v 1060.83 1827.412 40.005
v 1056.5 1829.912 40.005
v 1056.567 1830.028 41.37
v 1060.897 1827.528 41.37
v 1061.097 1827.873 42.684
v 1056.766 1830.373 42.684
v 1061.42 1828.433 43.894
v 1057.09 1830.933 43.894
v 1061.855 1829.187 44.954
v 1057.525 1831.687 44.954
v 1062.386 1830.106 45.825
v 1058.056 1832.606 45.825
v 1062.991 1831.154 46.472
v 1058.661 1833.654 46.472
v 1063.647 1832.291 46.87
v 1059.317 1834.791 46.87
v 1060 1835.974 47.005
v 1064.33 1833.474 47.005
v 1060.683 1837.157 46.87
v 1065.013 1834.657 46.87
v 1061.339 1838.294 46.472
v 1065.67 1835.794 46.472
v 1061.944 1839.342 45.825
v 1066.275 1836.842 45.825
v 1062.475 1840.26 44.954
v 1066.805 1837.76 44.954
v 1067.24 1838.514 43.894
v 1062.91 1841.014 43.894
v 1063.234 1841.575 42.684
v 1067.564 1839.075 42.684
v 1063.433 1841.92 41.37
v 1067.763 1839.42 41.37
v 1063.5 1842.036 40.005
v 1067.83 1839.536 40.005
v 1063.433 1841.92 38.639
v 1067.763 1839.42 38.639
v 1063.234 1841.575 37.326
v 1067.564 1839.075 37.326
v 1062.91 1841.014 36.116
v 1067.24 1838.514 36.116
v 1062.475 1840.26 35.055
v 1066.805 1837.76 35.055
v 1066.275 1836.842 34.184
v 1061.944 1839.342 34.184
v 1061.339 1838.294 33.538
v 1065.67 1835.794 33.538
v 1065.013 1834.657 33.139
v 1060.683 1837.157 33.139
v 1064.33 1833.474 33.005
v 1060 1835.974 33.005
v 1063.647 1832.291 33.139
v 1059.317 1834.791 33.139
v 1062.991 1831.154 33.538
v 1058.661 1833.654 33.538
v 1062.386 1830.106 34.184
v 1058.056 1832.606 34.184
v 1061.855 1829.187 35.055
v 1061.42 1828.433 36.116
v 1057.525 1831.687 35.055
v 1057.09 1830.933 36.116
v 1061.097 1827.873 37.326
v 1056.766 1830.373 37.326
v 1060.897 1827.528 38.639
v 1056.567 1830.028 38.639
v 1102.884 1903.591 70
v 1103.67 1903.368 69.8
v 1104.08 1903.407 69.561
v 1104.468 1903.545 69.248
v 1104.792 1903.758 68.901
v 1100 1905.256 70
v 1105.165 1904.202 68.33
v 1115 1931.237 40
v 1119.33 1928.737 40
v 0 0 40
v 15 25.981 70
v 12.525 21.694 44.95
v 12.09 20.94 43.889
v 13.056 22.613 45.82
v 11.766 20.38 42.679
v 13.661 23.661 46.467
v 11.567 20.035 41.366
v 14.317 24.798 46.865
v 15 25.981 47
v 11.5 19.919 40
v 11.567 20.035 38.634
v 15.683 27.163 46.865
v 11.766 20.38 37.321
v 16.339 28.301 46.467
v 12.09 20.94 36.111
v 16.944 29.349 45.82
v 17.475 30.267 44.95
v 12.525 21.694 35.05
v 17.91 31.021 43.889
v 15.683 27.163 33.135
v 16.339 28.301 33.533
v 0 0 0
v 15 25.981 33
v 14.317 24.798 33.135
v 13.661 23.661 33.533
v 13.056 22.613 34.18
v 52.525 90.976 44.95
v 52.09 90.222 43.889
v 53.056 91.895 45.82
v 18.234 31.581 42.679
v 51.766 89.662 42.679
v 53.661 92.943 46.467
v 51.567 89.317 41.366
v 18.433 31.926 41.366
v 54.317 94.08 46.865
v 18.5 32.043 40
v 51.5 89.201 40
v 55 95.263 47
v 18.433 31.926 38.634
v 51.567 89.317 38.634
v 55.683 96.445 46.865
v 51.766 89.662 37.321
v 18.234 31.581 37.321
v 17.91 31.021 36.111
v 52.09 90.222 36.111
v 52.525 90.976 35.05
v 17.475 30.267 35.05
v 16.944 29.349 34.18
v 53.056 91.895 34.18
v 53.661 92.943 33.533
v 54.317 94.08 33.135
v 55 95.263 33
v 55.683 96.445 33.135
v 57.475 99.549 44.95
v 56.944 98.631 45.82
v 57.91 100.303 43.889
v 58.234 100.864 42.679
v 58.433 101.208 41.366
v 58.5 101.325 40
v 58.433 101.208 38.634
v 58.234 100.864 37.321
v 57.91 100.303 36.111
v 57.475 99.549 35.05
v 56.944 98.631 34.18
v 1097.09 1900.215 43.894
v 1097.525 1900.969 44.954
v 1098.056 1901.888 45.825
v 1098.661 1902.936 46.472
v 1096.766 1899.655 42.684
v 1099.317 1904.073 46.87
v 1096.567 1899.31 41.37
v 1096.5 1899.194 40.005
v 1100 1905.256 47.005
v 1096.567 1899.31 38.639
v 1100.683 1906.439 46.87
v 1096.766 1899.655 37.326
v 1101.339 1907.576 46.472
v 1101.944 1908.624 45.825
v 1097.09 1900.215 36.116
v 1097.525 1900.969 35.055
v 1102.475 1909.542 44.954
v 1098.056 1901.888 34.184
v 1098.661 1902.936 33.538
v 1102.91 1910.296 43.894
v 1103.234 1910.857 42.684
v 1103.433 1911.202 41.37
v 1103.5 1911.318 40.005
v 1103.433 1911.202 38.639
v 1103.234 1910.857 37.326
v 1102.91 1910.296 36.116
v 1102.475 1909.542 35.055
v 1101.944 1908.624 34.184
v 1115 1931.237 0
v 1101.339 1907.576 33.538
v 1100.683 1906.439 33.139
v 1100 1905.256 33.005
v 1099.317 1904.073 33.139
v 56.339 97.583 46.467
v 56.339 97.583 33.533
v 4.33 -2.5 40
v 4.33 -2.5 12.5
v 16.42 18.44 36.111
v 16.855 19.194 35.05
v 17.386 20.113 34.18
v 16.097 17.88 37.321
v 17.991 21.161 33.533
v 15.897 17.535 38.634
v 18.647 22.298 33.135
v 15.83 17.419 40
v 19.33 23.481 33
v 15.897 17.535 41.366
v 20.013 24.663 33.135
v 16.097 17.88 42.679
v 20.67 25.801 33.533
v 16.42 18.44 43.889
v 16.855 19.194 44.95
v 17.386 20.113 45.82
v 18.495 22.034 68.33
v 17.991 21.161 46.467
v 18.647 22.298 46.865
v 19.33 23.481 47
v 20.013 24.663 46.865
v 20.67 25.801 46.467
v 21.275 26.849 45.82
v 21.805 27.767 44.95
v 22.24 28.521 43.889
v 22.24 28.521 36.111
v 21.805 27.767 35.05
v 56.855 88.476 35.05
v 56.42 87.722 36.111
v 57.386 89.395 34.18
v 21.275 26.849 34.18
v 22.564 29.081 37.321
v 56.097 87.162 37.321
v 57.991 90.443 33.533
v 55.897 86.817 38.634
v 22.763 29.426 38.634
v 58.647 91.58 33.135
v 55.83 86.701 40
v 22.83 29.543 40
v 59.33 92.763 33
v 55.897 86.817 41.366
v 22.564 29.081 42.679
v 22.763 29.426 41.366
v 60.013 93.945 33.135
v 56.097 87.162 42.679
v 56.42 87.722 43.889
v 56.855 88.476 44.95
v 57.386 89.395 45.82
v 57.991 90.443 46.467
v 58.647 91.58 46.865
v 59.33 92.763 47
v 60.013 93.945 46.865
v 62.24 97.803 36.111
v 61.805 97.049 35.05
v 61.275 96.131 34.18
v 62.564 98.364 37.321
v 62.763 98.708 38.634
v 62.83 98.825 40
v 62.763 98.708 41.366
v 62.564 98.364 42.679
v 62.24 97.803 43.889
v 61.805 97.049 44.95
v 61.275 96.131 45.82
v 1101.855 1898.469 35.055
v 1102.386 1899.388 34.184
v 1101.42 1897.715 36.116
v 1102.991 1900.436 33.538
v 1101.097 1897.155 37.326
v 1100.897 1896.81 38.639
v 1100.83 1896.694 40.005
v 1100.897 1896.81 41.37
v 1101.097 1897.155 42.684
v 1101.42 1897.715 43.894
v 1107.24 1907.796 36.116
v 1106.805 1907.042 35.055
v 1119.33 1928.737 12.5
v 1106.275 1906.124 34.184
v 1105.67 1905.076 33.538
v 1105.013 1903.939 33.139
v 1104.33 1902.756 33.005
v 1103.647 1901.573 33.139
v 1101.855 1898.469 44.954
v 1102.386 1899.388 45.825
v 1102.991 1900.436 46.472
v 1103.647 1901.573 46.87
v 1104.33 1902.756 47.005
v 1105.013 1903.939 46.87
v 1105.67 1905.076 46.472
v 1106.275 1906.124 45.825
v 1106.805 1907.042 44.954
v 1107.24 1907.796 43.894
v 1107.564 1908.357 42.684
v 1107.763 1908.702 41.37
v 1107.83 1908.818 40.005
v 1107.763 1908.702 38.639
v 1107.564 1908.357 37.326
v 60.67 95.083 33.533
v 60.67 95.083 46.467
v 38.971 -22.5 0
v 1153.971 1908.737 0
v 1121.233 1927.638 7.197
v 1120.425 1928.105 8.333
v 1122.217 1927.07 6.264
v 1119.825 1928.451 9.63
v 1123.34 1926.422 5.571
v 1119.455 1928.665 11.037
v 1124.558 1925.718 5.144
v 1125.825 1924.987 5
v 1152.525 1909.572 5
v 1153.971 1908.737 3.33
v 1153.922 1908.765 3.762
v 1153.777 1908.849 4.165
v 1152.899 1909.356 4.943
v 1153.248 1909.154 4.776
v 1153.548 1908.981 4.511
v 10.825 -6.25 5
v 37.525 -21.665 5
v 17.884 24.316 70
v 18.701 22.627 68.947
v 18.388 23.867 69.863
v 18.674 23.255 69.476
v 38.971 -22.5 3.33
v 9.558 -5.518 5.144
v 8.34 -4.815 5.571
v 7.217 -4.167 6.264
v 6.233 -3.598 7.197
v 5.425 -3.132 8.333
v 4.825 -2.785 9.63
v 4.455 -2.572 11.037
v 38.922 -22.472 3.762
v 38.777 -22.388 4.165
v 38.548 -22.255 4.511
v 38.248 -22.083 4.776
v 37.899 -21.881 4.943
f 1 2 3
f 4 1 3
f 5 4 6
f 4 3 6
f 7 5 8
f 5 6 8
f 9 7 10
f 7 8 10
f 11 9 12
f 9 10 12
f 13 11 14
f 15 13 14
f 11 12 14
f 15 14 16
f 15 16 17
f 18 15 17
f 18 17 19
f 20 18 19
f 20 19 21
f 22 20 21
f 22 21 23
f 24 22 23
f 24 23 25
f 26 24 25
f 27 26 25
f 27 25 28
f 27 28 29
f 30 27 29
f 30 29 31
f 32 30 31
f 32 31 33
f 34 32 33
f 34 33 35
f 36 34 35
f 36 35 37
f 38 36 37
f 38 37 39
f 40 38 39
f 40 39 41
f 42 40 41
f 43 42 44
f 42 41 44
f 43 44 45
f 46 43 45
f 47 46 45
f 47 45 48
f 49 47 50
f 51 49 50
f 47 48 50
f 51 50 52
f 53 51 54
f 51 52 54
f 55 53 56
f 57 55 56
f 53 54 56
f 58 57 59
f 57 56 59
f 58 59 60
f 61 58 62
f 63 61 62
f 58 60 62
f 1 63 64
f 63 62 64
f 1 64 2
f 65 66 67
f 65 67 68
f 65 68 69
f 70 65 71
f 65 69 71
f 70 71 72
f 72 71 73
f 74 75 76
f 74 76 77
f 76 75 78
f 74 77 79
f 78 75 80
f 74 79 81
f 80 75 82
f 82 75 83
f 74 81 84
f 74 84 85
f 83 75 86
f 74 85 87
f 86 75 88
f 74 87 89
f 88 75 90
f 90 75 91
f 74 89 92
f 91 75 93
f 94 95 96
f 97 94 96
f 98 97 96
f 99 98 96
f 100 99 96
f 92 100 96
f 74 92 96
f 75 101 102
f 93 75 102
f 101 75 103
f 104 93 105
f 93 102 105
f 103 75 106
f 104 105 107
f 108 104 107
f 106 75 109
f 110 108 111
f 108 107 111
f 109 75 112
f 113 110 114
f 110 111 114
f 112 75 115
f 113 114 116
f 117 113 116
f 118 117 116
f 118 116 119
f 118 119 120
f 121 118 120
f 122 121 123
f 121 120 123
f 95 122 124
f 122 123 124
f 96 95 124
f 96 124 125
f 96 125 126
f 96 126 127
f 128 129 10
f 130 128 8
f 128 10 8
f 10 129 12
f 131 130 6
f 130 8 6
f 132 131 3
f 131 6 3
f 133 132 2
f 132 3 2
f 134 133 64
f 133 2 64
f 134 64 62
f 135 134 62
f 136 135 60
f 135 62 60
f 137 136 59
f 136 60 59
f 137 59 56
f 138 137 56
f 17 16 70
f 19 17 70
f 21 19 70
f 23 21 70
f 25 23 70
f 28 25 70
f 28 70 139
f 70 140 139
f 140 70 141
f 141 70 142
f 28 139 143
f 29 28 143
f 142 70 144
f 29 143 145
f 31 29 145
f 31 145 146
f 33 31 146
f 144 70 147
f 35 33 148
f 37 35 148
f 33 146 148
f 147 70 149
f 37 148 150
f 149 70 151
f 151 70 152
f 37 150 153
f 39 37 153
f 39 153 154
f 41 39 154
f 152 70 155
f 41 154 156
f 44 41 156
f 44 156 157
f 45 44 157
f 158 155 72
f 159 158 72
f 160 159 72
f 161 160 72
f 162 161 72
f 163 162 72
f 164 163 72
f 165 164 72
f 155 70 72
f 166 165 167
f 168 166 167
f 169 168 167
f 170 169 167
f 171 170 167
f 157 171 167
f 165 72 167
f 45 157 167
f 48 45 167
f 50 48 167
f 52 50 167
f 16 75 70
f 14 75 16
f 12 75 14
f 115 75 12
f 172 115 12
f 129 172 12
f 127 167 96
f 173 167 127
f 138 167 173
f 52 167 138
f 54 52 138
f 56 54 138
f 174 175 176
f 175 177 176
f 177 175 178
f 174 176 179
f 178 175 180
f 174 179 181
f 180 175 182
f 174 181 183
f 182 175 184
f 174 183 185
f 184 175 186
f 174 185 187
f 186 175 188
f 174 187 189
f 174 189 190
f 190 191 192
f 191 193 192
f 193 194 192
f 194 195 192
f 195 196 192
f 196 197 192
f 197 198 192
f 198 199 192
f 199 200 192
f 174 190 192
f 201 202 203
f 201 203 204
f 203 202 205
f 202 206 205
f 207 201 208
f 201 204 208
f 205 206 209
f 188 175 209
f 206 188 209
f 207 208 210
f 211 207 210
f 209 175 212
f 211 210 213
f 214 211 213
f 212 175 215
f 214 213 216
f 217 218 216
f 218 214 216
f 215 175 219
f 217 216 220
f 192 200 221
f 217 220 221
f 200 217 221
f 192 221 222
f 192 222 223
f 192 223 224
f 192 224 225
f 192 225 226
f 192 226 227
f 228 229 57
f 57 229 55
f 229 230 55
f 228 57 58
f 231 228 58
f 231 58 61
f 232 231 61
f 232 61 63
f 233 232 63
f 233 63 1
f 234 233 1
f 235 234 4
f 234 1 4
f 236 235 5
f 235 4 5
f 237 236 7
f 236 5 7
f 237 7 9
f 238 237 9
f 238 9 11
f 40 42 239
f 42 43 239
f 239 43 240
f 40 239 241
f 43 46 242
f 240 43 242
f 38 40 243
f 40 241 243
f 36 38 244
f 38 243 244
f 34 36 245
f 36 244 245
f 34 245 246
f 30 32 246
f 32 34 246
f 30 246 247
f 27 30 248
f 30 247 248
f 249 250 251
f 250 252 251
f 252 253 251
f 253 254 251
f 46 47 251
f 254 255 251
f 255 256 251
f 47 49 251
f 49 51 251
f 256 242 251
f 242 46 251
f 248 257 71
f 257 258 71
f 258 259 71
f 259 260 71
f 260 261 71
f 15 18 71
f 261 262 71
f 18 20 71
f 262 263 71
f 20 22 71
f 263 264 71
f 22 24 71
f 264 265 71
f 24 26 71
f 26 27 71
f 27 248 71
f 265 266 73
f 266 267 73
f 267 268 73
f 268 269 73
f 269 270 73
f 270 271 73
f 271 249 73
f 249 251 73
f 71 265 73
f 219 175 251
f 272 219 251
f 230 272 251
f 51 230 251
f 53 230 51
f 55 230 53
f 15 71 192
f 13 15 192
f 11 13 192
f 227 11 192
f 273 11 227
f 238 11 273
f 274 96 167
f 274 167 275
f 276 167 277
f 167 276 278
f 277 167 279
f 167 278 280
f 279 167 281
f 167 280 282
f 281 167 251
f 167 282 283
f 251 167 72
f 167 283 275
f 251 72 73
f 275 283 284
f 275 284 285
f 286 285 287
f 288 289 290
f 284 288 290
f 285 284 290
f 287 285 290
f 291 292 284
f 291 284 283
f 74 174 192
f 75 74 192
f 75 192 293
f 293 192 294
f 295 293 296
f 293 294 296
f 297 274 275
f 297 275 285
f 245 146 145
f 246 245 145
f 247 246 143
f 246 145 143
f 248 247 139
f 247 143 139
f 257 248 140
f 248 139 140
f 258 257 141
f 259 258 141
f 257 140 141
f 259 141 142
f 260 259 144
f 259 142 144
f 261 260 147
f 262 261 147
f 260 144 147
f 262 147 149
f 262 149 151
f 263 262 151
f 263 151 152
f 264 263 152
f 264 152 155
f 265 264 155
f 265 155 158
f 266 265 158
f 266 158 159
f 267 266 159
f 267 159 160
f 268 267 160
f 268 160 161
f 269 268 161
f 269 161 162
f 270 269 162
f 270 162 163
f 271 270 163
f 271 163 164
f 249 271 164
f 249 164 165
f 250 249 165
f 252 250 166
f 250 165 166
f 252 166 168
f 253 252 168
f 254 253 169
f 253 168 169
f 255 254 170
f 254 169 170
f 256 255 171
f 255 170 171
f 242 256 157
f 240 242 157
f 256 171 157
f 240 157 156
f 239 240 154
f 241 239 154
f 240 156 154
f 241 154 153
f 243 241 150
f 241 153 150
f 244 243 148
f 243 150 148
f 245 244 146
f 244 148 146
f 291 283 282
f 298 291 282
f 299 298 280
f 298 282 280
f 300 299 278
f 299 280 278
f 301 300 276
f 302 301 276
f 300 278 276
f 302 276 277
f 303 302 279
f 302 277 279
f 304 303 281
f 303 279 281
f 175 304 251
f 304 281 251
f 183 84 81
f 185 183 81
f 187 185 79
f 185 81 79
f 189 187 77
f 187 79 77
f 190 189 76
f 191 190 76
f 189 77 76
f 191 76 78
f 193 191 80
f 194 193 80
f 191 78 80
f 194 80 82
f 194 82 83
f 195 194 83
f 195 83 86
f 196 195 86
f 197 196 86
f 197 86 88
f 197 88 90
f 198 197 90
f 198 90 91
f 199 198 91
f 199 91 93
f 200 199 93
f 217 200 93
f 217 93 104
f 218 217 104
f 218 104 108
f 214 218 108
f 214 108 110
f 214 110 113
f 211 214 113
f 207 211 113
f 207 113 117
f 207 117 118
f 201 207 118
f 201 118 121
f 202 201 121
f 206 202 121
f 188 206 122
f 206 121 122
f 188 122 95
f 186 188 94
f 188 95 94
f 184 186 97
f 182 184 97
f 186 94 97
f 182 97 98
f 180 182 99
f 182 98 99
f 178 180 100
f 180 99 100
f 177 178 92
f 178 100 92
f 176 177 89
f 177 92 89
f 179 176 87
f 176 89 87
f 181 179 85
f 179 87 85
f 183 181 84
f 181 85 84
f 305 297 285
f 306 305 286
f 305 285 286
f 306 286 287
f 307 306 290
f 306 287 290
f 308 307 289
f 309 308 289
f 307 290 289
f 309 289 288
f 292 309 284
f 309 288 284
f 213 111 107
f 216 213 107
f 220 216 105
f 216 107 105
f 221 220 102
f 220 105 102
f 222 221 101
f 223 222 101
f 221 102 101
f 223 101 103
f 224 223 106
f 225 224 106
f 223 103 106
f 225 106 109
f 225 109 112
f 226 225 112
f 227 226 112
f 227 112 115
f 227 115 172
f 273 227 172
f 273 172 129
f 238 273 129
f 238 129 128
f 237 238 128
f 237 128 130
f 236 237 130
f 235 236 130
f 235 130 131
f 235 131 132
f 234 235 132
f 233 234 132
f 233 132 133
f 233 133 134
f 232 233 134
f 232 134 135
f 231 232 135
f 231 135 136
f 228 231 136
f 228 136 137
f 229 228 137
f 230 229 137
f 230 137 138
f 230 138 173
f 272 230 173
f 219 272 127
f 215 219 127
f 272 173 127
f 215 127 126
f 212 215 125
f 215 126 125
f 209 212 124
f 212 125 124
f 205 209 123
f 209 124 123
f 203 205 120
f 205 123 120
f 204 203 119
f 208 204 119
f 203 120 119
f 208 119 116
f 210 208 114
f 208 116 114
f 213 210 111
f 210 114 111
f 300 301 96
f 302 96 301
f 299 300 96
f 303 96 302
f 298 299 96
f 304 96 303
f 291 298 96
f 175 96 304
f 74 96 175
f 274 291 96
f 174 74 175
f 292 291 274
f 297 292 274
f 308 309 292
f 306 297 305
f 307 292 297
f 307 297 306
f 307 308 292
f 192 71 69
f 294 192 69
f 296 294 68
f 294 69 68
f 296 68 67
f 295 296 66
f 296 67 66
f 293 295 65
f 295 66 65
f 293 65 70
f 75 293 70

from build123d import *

# Parameters (mm, degrees)
F_70X45X5_1_DEPTH   = 2230
CUT_EXTRUDE_1_REACH = 2252.827
SKETCH_12_R         = 7
CUT_EXTRUDE_2_REACH = 2252.827
SKETCH_13_R         = 7
CHAMFER_1_SIZE      = 30
CHAMFER_2_SIZE      = 30


with BuildPart() as part:
    # 草图11 → 不等边角钢 70X45X5(1) (new body)
    with BuildSketch(Plane(origin=(1115, 1931.236650439, 0), x_dir=(0.86602540378444, -0.49999999999999784, 0), z_dir=(-0.49999999999999784, -0.86602540378444, 0))):
        with BuildLine():
            Line((0, 70), (0, 0))
            Line((0, 0), (45, 0))
            Line((45, 0), (45, 3.33))
            ThreePointArc((45, 3.33), (44.510868325, 4.510868325), (43.33, 5))
            Line((43.33, 5), (12.5, 5))
            ThreePointArc((12.5, 5), (7.196699141, 7.196699141), (5, 12.5))
            Line((5, 12.5), (5, 68.33))
            ThreePointArc((5, 68.33), (4.510868325, 69.510868325), (3.33, 70))
            Line((3.33, 70), (0, 70))
        make_face()
    extrude(amount=F_70X45X5_1_DEPTH)

    # 草图12 → 切除-拉伸1 (cut, up to next)
    with BuildSketch(Plane(origin=(0, 0, 0), x_dir=(0, 0, 1), z_dir=(-0.86602540378444, 0.49999999999999784, 0)), mode=Mode.PRIVATE) as cut_extrude_1_sk1:
        with Locations(Location((40, 30, 0), (0, 0, 270))):
            Circle(SKETCH_12_R)
    cut_extrude_1_tool1 = extrude(cut_extrude_1_sk1.sketch, amount=-CUT_EXTRUDE_1_REACH, mode=Mode.PRIVATE) & part.part
    # 草图12 → 切除-拉伸1 (cut, up to next)
    with BuildSketch(Plane(origin=(0, 0, 0), x_dir=(0, 0, 1), z_dir=(-0.86602540378444, 0.49999999999999784, 0)), mode=Mode.PRIVATE) as cut_extrude_1_sk2:
        with Locations(Location((40, 110, 0), (0, 0, 270))):
            Circle(SKETCH_12_R)
    cut_extrude_1_tool2 = extrude(cut_extrude_1_sk2.sketch, amount=-CUT_EXTRUDE_1_REACH, mode=Mode.PRIVATE) & part.part
    add(cut_extrude_1_tool1.solids().sort_by_distance((15, 25.980762, 40))[0], mode=Mode.SUBTRACT)
    add(cut_extrude_1_tool2.solids().sort_by_distance((55, 95.262794, 40))[0], mode=Mode.SUBTRACT)

    # 草图13 → 切除-拉伸2 (cut, up to next)
    with BuildSketch(Plane(origin=(0, 0, 0), x_dir=(0, 0, 1), z_dir=(-0.86602540378444, 0.49999999999999784, 0)), mode=Mode.PRIVATE) as cut_extrude_2_sk1:
        with Locations(Location((40.004723234, 2120, 0), (0, 0, 270))):
            Circle(SKETCH_13_R)
    cut_extrude_2_tool1 = extrude(cut_extrude_2_sk1.sketch, amount=-CUT_EXTRUDE_2_REACH, mode=Mode.PRIVATE) & part.part
    # 草图13 → 切除-拉伸2 (cut, up to next)
    with BuildSketch(Plane(origin=(0, 0, 0), x_dir=(0, 0, 1), z_dir=(-0.86602540378444, 0.49999999999999784, 0)), mode=Mode.PRIVATE) as cut_extrude_2_sk2:
        with Locations(Location((40.004723234, 2200, 0), (0, 0, 270))):
            Circle(SKETCH_13_R)
    cut_extrude_2_tool2 = extrude(cut_extrude_2_sk2.sketch, amount=-CUT_EXTRUDE_2_REACH, mode=Mode.PRIVATE) & part.part
    add(cut_extrude_2_tool1.solids().sort_by_distance((1060, 1835.973856, 40.004723))[0], mode=Mode.SUBTRACT)
    add(cut_extrude_2_tool2.solids().sort_by_distance((1100, 1905.255888, 40.004723))[0], mode=Mode.SUBTRACT)

    # 倒角1
    # the kernel refuses this chamfer: 30 mm, written as the material it takes off along each edge
    with BuildSketch(Plane(origin=(1184.698148536, 1890.99640562, 70), x_dir=(-0.49981095845564616, -0.8656979742248816, 0.02749587661058632), z_dir=(-0.86602540378444, 0.49999999999999784, 0))) as chamfer_1_piece_1:
        Polygon((CHAMFER_1_SIZE * 0.999621916911, -CHAMFER_1_SIZE * 0.0274958766106), (-CHAMFER_1_SIZE * 0.0274958766106, -CHAMFER_1_SIZE * 0.999621916911), (0, 0), align=None)
    extrude(amount=157.630979278, mode=Mode.SUBTRACT)

    # 倒角2
    # the kernel refuses this chamfer: 30 mm, written as the material it takes off along each edge
    with BuildSketch(Plane(origin=(69.698148536, -40.240244819, 70), x_dir=(-0.013747938305293054, -0.023812127644090075, -0.9996219169112966), z_dir=(-0.86602540378444, 0.49999999999999784, 0))) as chamfer_2_piece_1:
        Polygon((CHAMFER_2_SIZE * 0.999621916911, -CHAMFER_2_SIZE * 0.0274958766106), (-CHAMFER_2_SIZE * 0.0274958766106, -CHAMFER_2_SIZE * 0.999621916911), (0, 0), align=None)
    extrude(amount=157.630979278, mode=Mode.SUBTRACT)


solid = part.part
